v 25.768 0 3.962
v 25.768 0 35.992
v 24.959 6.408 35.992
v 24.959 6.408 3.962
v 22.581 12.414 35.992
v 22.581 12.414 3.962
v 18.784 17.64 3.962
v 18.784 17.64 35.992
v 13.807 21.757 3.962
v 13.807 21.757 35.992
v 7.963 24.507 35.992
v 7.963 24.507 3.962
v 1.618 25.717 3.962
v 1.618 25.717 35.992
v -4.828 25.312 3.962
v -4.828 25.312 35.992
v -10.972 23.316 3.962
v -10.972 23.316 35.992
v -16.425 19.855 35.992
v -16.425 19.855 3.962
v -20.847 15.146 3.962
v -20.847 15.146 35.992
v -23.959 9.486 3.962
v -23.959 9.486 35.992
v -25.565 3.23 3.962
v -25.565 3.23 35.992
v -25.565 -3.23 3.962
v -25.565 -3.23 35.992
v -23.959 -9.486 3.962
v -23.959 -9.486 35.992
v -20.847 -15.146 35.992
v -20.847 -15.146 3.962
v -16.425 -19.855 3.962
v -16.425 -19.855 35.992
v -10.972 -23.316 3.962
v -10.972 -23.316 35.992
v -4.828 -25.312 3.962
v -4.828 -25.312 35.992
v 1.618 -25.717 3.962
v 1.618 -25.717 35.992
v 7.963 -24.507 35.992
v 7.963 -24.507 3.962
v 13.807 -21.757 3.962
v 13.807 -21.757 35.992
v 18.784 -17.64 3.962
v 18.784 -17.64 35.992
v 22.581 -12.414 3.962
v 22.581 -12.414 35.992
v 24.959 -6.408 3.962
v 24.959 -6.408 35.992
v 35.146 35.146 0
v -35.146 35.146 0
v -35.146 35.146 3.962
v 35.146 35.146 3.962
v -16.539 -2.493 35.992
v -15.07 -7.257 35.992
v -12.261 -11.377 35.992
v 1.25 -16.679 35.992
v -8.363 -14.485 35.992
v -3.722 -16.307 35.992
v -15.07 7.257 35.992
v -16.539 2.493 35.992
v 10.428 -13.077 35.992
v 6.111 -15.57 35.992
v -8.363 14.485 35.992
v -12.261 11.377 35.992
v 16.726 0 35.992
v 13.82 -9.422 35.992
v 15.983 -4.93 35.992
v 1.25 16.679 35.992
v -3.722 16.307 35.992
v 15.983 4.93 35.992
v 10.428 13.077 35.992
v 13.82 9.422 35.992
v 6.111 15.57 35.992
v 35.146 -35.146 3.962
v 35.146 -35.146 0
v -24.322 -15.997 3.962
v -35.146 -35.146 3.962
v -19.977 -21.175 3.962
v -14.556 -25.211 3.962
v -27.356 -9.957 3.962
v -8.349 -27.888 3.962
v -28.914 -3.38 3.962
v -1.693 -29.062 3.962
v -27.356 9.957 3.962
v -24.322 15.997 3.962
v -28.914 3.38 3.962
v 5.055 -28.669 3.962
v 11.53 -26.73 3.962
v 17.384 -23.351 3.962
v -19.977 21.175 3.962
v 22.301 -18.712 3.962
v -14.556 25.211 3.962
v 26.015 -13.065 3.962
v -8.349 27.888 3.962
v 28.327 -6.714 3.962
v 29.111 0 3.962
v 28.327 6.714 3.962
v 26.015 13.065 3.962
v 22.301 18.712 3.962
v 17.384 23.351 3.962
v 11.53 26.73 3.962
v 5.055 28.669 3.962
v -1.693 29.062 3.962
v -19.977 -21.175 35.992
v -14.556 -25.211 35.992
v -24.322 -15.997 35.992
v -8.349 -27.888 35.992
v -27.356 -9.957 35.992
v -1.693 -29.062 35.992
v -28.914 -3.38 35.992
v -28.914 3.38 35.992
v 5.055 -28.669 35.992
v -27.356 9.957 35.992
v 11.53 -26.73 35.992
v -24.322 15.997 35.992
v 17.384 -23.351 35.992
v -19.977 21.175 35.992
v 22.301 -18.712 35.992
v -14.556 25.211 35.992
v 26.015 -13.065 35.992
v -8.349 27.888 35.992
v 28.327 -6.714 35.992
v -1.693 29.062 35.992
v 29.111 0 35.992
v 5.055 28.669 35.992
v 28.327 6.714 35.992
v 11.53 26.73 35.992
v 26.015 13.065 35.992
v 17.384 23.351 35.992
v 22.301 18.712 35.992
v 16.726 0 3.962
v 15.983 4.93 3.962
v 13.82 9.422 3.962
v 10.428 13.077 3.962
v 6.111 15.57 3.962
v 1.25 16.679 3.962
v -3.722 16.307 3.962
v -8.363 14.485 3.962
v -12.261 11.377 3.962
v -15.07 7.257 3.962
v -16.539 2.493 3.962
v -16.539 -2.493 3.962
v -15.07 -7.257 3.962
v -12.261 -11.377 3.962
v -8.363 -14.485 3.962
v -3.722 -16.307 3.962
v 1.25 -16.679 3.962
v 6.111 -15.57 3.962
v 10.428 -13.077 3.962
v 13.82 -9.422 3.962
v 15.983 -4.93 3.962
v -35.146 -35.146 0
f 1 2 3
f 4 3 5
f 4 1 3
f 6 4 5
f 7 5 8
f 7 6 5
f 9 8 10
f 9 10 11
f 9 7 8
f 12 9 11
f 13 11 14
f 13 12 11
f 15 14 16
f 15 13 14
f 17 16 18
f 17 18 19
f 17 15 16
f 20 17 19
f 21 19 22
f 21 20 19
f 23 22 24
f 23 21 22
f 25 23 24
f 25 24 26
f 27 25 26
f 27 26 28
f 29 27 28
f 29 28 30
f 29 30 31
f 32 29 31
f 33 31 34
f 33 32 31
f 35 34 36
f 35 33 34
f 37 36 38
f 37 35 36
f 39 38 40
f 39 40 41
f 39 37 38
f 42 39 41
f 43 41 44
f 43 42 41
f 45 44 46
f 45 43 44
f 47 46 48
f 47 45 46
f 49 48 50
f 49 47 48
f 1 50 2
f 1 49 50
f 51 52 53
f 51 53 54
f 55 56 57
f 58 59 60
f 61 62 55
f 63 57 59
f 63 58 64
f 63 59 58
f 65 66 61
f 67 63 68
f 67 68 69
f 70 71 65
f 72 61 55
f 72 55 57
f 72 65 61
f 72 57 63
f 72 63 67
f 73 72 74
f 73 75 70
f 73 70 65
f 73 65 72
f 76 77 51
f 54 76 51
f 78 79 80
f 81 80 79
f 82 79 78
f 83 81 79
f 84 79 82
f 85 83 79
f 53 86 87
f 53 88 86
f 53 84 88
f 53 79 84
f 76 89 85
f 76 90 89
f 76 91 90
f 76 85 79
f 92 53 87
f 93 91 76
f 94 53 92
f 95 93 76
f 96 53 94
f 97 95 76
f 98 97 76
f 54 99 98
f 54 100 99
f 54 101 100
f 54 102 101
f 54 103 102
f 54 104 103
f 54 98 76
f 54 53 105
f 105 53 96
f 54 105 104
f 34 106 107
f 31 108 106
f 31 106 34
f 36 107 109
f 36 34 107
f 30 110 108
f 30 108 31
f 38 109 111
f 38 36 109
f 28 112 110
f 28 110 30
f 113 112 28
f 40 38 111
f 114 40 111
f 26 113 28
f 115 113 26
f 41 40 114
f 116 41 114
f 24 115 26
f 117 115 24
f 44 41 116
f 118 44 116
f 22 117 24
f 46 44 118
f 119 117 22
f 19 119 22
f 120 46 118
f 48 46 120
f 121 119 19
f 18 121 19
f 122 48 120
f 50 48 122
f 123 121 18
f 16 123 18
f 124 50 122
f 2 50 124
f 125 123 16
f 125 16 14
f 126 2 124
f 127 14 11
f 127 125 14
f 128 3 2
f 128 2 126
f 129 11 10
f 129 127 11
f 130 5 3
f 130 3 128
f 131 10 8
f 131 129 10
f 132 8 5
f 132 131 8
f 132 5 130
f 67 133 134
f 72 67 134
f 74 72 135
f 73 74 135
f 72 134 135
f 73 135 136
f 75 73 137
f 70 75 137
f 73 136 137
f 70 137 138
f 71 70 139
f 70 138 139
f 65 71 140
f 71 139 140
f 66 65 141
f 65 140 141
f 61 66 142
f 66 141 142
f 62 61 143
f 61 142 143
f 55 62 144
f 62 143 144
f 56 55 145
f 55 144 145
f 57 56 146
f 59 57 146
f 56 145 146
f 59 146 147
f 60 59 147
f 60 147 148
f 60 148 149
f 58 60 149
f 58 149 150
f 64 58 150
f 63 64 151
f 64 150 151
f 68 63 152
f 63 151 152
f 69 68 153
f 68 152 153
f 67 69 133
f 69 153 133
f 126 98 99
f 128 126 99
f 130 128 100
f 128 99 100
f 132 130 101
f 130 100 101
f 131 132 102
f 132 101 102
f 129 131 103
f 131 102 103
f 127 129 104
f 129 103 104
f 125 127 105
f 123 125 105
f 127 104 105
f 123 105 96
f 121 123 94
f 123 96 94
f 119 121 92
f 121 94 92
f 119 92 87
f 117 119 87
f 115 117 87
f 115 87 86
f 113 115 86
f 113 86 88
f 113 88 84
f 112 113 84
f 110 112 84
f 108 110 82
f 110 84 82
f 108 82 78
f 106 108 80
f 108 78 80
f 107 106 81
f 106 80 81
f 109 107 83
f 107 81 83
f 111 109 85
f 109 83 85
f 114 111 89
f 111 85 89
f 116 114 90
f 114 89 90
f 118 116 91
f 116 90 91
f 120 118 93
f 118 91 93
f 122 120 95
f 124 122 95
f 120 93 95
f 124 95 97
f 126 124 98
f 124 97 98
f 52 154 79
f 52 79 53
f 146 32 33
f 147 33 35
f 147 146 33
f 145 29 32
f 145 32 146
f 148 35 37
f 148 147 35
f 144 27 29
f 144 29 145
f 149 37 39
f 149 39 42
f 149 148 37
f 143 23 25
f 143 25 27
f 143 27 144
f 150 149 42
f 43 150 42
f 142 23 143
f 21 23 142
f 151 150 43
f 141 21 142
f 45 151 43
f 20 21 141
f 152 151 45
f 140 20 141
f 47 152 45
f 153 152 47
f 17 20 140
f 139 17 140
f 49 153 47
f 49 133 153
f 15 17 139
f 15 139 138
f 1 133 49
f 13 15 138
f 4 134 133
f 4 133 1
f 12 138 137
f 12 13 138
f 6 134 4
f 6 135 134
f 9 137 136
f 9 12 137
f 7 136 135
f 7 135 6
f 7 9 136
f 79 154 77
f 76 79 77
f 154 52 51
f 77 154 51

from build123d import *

# Parameters (mm, degrees)
SKETCH1_W           = 70.29196
SKETCH1_H           = 70.29196
BOSS_EXTRUDE1_DEPTH = 3.9624
BOSS_EXTRUDE2_START = 3.9624
SKETCH1_3_R         = 29.111326452
SKETCH1_3_R_2       = 25.7683
BOSS_EXTRUDE2_DEPTH = 32.0294
BOSS_EXTRUDE3_START = 3.9624
SKETCH1_4_R         = 16.7259
BOSS_EXTRUDE3_DEPTH = 32.0294


with BuildPart() as part:
    # Sketch1 → Boss-Extrude1 (new body)
    with BuildSketch(Plane.XY):
        Rectangle(SKETCH1_W, SKETCH1_H)
    extrude(amount=BOSS_EXTRUDE1_DEPTH)

    # Sketch1<3> → Boss-Extrude2 (add)
    with BuildSketch(Plane.XY.offset(BOSS_EXTRUDE2_START)):
        Circle(SKETCH1_3_R)
        Circle(SKETCH1_3_R_2, mode=Mode.SUBTRACT)
    extrude(amount=BOSS_EXTRUDE2_DEPTH)

    # Sketch1<4> → Boss-Extrude3 (add)
    with BuildSketch(Plane.XY.offset(BOSS_EXTRUDE3_START)):
        Circle(SKETCH1_4_R)
    extrude(amount=BOSS_EXTRUDE3_DEPTH)


solid = part.part
